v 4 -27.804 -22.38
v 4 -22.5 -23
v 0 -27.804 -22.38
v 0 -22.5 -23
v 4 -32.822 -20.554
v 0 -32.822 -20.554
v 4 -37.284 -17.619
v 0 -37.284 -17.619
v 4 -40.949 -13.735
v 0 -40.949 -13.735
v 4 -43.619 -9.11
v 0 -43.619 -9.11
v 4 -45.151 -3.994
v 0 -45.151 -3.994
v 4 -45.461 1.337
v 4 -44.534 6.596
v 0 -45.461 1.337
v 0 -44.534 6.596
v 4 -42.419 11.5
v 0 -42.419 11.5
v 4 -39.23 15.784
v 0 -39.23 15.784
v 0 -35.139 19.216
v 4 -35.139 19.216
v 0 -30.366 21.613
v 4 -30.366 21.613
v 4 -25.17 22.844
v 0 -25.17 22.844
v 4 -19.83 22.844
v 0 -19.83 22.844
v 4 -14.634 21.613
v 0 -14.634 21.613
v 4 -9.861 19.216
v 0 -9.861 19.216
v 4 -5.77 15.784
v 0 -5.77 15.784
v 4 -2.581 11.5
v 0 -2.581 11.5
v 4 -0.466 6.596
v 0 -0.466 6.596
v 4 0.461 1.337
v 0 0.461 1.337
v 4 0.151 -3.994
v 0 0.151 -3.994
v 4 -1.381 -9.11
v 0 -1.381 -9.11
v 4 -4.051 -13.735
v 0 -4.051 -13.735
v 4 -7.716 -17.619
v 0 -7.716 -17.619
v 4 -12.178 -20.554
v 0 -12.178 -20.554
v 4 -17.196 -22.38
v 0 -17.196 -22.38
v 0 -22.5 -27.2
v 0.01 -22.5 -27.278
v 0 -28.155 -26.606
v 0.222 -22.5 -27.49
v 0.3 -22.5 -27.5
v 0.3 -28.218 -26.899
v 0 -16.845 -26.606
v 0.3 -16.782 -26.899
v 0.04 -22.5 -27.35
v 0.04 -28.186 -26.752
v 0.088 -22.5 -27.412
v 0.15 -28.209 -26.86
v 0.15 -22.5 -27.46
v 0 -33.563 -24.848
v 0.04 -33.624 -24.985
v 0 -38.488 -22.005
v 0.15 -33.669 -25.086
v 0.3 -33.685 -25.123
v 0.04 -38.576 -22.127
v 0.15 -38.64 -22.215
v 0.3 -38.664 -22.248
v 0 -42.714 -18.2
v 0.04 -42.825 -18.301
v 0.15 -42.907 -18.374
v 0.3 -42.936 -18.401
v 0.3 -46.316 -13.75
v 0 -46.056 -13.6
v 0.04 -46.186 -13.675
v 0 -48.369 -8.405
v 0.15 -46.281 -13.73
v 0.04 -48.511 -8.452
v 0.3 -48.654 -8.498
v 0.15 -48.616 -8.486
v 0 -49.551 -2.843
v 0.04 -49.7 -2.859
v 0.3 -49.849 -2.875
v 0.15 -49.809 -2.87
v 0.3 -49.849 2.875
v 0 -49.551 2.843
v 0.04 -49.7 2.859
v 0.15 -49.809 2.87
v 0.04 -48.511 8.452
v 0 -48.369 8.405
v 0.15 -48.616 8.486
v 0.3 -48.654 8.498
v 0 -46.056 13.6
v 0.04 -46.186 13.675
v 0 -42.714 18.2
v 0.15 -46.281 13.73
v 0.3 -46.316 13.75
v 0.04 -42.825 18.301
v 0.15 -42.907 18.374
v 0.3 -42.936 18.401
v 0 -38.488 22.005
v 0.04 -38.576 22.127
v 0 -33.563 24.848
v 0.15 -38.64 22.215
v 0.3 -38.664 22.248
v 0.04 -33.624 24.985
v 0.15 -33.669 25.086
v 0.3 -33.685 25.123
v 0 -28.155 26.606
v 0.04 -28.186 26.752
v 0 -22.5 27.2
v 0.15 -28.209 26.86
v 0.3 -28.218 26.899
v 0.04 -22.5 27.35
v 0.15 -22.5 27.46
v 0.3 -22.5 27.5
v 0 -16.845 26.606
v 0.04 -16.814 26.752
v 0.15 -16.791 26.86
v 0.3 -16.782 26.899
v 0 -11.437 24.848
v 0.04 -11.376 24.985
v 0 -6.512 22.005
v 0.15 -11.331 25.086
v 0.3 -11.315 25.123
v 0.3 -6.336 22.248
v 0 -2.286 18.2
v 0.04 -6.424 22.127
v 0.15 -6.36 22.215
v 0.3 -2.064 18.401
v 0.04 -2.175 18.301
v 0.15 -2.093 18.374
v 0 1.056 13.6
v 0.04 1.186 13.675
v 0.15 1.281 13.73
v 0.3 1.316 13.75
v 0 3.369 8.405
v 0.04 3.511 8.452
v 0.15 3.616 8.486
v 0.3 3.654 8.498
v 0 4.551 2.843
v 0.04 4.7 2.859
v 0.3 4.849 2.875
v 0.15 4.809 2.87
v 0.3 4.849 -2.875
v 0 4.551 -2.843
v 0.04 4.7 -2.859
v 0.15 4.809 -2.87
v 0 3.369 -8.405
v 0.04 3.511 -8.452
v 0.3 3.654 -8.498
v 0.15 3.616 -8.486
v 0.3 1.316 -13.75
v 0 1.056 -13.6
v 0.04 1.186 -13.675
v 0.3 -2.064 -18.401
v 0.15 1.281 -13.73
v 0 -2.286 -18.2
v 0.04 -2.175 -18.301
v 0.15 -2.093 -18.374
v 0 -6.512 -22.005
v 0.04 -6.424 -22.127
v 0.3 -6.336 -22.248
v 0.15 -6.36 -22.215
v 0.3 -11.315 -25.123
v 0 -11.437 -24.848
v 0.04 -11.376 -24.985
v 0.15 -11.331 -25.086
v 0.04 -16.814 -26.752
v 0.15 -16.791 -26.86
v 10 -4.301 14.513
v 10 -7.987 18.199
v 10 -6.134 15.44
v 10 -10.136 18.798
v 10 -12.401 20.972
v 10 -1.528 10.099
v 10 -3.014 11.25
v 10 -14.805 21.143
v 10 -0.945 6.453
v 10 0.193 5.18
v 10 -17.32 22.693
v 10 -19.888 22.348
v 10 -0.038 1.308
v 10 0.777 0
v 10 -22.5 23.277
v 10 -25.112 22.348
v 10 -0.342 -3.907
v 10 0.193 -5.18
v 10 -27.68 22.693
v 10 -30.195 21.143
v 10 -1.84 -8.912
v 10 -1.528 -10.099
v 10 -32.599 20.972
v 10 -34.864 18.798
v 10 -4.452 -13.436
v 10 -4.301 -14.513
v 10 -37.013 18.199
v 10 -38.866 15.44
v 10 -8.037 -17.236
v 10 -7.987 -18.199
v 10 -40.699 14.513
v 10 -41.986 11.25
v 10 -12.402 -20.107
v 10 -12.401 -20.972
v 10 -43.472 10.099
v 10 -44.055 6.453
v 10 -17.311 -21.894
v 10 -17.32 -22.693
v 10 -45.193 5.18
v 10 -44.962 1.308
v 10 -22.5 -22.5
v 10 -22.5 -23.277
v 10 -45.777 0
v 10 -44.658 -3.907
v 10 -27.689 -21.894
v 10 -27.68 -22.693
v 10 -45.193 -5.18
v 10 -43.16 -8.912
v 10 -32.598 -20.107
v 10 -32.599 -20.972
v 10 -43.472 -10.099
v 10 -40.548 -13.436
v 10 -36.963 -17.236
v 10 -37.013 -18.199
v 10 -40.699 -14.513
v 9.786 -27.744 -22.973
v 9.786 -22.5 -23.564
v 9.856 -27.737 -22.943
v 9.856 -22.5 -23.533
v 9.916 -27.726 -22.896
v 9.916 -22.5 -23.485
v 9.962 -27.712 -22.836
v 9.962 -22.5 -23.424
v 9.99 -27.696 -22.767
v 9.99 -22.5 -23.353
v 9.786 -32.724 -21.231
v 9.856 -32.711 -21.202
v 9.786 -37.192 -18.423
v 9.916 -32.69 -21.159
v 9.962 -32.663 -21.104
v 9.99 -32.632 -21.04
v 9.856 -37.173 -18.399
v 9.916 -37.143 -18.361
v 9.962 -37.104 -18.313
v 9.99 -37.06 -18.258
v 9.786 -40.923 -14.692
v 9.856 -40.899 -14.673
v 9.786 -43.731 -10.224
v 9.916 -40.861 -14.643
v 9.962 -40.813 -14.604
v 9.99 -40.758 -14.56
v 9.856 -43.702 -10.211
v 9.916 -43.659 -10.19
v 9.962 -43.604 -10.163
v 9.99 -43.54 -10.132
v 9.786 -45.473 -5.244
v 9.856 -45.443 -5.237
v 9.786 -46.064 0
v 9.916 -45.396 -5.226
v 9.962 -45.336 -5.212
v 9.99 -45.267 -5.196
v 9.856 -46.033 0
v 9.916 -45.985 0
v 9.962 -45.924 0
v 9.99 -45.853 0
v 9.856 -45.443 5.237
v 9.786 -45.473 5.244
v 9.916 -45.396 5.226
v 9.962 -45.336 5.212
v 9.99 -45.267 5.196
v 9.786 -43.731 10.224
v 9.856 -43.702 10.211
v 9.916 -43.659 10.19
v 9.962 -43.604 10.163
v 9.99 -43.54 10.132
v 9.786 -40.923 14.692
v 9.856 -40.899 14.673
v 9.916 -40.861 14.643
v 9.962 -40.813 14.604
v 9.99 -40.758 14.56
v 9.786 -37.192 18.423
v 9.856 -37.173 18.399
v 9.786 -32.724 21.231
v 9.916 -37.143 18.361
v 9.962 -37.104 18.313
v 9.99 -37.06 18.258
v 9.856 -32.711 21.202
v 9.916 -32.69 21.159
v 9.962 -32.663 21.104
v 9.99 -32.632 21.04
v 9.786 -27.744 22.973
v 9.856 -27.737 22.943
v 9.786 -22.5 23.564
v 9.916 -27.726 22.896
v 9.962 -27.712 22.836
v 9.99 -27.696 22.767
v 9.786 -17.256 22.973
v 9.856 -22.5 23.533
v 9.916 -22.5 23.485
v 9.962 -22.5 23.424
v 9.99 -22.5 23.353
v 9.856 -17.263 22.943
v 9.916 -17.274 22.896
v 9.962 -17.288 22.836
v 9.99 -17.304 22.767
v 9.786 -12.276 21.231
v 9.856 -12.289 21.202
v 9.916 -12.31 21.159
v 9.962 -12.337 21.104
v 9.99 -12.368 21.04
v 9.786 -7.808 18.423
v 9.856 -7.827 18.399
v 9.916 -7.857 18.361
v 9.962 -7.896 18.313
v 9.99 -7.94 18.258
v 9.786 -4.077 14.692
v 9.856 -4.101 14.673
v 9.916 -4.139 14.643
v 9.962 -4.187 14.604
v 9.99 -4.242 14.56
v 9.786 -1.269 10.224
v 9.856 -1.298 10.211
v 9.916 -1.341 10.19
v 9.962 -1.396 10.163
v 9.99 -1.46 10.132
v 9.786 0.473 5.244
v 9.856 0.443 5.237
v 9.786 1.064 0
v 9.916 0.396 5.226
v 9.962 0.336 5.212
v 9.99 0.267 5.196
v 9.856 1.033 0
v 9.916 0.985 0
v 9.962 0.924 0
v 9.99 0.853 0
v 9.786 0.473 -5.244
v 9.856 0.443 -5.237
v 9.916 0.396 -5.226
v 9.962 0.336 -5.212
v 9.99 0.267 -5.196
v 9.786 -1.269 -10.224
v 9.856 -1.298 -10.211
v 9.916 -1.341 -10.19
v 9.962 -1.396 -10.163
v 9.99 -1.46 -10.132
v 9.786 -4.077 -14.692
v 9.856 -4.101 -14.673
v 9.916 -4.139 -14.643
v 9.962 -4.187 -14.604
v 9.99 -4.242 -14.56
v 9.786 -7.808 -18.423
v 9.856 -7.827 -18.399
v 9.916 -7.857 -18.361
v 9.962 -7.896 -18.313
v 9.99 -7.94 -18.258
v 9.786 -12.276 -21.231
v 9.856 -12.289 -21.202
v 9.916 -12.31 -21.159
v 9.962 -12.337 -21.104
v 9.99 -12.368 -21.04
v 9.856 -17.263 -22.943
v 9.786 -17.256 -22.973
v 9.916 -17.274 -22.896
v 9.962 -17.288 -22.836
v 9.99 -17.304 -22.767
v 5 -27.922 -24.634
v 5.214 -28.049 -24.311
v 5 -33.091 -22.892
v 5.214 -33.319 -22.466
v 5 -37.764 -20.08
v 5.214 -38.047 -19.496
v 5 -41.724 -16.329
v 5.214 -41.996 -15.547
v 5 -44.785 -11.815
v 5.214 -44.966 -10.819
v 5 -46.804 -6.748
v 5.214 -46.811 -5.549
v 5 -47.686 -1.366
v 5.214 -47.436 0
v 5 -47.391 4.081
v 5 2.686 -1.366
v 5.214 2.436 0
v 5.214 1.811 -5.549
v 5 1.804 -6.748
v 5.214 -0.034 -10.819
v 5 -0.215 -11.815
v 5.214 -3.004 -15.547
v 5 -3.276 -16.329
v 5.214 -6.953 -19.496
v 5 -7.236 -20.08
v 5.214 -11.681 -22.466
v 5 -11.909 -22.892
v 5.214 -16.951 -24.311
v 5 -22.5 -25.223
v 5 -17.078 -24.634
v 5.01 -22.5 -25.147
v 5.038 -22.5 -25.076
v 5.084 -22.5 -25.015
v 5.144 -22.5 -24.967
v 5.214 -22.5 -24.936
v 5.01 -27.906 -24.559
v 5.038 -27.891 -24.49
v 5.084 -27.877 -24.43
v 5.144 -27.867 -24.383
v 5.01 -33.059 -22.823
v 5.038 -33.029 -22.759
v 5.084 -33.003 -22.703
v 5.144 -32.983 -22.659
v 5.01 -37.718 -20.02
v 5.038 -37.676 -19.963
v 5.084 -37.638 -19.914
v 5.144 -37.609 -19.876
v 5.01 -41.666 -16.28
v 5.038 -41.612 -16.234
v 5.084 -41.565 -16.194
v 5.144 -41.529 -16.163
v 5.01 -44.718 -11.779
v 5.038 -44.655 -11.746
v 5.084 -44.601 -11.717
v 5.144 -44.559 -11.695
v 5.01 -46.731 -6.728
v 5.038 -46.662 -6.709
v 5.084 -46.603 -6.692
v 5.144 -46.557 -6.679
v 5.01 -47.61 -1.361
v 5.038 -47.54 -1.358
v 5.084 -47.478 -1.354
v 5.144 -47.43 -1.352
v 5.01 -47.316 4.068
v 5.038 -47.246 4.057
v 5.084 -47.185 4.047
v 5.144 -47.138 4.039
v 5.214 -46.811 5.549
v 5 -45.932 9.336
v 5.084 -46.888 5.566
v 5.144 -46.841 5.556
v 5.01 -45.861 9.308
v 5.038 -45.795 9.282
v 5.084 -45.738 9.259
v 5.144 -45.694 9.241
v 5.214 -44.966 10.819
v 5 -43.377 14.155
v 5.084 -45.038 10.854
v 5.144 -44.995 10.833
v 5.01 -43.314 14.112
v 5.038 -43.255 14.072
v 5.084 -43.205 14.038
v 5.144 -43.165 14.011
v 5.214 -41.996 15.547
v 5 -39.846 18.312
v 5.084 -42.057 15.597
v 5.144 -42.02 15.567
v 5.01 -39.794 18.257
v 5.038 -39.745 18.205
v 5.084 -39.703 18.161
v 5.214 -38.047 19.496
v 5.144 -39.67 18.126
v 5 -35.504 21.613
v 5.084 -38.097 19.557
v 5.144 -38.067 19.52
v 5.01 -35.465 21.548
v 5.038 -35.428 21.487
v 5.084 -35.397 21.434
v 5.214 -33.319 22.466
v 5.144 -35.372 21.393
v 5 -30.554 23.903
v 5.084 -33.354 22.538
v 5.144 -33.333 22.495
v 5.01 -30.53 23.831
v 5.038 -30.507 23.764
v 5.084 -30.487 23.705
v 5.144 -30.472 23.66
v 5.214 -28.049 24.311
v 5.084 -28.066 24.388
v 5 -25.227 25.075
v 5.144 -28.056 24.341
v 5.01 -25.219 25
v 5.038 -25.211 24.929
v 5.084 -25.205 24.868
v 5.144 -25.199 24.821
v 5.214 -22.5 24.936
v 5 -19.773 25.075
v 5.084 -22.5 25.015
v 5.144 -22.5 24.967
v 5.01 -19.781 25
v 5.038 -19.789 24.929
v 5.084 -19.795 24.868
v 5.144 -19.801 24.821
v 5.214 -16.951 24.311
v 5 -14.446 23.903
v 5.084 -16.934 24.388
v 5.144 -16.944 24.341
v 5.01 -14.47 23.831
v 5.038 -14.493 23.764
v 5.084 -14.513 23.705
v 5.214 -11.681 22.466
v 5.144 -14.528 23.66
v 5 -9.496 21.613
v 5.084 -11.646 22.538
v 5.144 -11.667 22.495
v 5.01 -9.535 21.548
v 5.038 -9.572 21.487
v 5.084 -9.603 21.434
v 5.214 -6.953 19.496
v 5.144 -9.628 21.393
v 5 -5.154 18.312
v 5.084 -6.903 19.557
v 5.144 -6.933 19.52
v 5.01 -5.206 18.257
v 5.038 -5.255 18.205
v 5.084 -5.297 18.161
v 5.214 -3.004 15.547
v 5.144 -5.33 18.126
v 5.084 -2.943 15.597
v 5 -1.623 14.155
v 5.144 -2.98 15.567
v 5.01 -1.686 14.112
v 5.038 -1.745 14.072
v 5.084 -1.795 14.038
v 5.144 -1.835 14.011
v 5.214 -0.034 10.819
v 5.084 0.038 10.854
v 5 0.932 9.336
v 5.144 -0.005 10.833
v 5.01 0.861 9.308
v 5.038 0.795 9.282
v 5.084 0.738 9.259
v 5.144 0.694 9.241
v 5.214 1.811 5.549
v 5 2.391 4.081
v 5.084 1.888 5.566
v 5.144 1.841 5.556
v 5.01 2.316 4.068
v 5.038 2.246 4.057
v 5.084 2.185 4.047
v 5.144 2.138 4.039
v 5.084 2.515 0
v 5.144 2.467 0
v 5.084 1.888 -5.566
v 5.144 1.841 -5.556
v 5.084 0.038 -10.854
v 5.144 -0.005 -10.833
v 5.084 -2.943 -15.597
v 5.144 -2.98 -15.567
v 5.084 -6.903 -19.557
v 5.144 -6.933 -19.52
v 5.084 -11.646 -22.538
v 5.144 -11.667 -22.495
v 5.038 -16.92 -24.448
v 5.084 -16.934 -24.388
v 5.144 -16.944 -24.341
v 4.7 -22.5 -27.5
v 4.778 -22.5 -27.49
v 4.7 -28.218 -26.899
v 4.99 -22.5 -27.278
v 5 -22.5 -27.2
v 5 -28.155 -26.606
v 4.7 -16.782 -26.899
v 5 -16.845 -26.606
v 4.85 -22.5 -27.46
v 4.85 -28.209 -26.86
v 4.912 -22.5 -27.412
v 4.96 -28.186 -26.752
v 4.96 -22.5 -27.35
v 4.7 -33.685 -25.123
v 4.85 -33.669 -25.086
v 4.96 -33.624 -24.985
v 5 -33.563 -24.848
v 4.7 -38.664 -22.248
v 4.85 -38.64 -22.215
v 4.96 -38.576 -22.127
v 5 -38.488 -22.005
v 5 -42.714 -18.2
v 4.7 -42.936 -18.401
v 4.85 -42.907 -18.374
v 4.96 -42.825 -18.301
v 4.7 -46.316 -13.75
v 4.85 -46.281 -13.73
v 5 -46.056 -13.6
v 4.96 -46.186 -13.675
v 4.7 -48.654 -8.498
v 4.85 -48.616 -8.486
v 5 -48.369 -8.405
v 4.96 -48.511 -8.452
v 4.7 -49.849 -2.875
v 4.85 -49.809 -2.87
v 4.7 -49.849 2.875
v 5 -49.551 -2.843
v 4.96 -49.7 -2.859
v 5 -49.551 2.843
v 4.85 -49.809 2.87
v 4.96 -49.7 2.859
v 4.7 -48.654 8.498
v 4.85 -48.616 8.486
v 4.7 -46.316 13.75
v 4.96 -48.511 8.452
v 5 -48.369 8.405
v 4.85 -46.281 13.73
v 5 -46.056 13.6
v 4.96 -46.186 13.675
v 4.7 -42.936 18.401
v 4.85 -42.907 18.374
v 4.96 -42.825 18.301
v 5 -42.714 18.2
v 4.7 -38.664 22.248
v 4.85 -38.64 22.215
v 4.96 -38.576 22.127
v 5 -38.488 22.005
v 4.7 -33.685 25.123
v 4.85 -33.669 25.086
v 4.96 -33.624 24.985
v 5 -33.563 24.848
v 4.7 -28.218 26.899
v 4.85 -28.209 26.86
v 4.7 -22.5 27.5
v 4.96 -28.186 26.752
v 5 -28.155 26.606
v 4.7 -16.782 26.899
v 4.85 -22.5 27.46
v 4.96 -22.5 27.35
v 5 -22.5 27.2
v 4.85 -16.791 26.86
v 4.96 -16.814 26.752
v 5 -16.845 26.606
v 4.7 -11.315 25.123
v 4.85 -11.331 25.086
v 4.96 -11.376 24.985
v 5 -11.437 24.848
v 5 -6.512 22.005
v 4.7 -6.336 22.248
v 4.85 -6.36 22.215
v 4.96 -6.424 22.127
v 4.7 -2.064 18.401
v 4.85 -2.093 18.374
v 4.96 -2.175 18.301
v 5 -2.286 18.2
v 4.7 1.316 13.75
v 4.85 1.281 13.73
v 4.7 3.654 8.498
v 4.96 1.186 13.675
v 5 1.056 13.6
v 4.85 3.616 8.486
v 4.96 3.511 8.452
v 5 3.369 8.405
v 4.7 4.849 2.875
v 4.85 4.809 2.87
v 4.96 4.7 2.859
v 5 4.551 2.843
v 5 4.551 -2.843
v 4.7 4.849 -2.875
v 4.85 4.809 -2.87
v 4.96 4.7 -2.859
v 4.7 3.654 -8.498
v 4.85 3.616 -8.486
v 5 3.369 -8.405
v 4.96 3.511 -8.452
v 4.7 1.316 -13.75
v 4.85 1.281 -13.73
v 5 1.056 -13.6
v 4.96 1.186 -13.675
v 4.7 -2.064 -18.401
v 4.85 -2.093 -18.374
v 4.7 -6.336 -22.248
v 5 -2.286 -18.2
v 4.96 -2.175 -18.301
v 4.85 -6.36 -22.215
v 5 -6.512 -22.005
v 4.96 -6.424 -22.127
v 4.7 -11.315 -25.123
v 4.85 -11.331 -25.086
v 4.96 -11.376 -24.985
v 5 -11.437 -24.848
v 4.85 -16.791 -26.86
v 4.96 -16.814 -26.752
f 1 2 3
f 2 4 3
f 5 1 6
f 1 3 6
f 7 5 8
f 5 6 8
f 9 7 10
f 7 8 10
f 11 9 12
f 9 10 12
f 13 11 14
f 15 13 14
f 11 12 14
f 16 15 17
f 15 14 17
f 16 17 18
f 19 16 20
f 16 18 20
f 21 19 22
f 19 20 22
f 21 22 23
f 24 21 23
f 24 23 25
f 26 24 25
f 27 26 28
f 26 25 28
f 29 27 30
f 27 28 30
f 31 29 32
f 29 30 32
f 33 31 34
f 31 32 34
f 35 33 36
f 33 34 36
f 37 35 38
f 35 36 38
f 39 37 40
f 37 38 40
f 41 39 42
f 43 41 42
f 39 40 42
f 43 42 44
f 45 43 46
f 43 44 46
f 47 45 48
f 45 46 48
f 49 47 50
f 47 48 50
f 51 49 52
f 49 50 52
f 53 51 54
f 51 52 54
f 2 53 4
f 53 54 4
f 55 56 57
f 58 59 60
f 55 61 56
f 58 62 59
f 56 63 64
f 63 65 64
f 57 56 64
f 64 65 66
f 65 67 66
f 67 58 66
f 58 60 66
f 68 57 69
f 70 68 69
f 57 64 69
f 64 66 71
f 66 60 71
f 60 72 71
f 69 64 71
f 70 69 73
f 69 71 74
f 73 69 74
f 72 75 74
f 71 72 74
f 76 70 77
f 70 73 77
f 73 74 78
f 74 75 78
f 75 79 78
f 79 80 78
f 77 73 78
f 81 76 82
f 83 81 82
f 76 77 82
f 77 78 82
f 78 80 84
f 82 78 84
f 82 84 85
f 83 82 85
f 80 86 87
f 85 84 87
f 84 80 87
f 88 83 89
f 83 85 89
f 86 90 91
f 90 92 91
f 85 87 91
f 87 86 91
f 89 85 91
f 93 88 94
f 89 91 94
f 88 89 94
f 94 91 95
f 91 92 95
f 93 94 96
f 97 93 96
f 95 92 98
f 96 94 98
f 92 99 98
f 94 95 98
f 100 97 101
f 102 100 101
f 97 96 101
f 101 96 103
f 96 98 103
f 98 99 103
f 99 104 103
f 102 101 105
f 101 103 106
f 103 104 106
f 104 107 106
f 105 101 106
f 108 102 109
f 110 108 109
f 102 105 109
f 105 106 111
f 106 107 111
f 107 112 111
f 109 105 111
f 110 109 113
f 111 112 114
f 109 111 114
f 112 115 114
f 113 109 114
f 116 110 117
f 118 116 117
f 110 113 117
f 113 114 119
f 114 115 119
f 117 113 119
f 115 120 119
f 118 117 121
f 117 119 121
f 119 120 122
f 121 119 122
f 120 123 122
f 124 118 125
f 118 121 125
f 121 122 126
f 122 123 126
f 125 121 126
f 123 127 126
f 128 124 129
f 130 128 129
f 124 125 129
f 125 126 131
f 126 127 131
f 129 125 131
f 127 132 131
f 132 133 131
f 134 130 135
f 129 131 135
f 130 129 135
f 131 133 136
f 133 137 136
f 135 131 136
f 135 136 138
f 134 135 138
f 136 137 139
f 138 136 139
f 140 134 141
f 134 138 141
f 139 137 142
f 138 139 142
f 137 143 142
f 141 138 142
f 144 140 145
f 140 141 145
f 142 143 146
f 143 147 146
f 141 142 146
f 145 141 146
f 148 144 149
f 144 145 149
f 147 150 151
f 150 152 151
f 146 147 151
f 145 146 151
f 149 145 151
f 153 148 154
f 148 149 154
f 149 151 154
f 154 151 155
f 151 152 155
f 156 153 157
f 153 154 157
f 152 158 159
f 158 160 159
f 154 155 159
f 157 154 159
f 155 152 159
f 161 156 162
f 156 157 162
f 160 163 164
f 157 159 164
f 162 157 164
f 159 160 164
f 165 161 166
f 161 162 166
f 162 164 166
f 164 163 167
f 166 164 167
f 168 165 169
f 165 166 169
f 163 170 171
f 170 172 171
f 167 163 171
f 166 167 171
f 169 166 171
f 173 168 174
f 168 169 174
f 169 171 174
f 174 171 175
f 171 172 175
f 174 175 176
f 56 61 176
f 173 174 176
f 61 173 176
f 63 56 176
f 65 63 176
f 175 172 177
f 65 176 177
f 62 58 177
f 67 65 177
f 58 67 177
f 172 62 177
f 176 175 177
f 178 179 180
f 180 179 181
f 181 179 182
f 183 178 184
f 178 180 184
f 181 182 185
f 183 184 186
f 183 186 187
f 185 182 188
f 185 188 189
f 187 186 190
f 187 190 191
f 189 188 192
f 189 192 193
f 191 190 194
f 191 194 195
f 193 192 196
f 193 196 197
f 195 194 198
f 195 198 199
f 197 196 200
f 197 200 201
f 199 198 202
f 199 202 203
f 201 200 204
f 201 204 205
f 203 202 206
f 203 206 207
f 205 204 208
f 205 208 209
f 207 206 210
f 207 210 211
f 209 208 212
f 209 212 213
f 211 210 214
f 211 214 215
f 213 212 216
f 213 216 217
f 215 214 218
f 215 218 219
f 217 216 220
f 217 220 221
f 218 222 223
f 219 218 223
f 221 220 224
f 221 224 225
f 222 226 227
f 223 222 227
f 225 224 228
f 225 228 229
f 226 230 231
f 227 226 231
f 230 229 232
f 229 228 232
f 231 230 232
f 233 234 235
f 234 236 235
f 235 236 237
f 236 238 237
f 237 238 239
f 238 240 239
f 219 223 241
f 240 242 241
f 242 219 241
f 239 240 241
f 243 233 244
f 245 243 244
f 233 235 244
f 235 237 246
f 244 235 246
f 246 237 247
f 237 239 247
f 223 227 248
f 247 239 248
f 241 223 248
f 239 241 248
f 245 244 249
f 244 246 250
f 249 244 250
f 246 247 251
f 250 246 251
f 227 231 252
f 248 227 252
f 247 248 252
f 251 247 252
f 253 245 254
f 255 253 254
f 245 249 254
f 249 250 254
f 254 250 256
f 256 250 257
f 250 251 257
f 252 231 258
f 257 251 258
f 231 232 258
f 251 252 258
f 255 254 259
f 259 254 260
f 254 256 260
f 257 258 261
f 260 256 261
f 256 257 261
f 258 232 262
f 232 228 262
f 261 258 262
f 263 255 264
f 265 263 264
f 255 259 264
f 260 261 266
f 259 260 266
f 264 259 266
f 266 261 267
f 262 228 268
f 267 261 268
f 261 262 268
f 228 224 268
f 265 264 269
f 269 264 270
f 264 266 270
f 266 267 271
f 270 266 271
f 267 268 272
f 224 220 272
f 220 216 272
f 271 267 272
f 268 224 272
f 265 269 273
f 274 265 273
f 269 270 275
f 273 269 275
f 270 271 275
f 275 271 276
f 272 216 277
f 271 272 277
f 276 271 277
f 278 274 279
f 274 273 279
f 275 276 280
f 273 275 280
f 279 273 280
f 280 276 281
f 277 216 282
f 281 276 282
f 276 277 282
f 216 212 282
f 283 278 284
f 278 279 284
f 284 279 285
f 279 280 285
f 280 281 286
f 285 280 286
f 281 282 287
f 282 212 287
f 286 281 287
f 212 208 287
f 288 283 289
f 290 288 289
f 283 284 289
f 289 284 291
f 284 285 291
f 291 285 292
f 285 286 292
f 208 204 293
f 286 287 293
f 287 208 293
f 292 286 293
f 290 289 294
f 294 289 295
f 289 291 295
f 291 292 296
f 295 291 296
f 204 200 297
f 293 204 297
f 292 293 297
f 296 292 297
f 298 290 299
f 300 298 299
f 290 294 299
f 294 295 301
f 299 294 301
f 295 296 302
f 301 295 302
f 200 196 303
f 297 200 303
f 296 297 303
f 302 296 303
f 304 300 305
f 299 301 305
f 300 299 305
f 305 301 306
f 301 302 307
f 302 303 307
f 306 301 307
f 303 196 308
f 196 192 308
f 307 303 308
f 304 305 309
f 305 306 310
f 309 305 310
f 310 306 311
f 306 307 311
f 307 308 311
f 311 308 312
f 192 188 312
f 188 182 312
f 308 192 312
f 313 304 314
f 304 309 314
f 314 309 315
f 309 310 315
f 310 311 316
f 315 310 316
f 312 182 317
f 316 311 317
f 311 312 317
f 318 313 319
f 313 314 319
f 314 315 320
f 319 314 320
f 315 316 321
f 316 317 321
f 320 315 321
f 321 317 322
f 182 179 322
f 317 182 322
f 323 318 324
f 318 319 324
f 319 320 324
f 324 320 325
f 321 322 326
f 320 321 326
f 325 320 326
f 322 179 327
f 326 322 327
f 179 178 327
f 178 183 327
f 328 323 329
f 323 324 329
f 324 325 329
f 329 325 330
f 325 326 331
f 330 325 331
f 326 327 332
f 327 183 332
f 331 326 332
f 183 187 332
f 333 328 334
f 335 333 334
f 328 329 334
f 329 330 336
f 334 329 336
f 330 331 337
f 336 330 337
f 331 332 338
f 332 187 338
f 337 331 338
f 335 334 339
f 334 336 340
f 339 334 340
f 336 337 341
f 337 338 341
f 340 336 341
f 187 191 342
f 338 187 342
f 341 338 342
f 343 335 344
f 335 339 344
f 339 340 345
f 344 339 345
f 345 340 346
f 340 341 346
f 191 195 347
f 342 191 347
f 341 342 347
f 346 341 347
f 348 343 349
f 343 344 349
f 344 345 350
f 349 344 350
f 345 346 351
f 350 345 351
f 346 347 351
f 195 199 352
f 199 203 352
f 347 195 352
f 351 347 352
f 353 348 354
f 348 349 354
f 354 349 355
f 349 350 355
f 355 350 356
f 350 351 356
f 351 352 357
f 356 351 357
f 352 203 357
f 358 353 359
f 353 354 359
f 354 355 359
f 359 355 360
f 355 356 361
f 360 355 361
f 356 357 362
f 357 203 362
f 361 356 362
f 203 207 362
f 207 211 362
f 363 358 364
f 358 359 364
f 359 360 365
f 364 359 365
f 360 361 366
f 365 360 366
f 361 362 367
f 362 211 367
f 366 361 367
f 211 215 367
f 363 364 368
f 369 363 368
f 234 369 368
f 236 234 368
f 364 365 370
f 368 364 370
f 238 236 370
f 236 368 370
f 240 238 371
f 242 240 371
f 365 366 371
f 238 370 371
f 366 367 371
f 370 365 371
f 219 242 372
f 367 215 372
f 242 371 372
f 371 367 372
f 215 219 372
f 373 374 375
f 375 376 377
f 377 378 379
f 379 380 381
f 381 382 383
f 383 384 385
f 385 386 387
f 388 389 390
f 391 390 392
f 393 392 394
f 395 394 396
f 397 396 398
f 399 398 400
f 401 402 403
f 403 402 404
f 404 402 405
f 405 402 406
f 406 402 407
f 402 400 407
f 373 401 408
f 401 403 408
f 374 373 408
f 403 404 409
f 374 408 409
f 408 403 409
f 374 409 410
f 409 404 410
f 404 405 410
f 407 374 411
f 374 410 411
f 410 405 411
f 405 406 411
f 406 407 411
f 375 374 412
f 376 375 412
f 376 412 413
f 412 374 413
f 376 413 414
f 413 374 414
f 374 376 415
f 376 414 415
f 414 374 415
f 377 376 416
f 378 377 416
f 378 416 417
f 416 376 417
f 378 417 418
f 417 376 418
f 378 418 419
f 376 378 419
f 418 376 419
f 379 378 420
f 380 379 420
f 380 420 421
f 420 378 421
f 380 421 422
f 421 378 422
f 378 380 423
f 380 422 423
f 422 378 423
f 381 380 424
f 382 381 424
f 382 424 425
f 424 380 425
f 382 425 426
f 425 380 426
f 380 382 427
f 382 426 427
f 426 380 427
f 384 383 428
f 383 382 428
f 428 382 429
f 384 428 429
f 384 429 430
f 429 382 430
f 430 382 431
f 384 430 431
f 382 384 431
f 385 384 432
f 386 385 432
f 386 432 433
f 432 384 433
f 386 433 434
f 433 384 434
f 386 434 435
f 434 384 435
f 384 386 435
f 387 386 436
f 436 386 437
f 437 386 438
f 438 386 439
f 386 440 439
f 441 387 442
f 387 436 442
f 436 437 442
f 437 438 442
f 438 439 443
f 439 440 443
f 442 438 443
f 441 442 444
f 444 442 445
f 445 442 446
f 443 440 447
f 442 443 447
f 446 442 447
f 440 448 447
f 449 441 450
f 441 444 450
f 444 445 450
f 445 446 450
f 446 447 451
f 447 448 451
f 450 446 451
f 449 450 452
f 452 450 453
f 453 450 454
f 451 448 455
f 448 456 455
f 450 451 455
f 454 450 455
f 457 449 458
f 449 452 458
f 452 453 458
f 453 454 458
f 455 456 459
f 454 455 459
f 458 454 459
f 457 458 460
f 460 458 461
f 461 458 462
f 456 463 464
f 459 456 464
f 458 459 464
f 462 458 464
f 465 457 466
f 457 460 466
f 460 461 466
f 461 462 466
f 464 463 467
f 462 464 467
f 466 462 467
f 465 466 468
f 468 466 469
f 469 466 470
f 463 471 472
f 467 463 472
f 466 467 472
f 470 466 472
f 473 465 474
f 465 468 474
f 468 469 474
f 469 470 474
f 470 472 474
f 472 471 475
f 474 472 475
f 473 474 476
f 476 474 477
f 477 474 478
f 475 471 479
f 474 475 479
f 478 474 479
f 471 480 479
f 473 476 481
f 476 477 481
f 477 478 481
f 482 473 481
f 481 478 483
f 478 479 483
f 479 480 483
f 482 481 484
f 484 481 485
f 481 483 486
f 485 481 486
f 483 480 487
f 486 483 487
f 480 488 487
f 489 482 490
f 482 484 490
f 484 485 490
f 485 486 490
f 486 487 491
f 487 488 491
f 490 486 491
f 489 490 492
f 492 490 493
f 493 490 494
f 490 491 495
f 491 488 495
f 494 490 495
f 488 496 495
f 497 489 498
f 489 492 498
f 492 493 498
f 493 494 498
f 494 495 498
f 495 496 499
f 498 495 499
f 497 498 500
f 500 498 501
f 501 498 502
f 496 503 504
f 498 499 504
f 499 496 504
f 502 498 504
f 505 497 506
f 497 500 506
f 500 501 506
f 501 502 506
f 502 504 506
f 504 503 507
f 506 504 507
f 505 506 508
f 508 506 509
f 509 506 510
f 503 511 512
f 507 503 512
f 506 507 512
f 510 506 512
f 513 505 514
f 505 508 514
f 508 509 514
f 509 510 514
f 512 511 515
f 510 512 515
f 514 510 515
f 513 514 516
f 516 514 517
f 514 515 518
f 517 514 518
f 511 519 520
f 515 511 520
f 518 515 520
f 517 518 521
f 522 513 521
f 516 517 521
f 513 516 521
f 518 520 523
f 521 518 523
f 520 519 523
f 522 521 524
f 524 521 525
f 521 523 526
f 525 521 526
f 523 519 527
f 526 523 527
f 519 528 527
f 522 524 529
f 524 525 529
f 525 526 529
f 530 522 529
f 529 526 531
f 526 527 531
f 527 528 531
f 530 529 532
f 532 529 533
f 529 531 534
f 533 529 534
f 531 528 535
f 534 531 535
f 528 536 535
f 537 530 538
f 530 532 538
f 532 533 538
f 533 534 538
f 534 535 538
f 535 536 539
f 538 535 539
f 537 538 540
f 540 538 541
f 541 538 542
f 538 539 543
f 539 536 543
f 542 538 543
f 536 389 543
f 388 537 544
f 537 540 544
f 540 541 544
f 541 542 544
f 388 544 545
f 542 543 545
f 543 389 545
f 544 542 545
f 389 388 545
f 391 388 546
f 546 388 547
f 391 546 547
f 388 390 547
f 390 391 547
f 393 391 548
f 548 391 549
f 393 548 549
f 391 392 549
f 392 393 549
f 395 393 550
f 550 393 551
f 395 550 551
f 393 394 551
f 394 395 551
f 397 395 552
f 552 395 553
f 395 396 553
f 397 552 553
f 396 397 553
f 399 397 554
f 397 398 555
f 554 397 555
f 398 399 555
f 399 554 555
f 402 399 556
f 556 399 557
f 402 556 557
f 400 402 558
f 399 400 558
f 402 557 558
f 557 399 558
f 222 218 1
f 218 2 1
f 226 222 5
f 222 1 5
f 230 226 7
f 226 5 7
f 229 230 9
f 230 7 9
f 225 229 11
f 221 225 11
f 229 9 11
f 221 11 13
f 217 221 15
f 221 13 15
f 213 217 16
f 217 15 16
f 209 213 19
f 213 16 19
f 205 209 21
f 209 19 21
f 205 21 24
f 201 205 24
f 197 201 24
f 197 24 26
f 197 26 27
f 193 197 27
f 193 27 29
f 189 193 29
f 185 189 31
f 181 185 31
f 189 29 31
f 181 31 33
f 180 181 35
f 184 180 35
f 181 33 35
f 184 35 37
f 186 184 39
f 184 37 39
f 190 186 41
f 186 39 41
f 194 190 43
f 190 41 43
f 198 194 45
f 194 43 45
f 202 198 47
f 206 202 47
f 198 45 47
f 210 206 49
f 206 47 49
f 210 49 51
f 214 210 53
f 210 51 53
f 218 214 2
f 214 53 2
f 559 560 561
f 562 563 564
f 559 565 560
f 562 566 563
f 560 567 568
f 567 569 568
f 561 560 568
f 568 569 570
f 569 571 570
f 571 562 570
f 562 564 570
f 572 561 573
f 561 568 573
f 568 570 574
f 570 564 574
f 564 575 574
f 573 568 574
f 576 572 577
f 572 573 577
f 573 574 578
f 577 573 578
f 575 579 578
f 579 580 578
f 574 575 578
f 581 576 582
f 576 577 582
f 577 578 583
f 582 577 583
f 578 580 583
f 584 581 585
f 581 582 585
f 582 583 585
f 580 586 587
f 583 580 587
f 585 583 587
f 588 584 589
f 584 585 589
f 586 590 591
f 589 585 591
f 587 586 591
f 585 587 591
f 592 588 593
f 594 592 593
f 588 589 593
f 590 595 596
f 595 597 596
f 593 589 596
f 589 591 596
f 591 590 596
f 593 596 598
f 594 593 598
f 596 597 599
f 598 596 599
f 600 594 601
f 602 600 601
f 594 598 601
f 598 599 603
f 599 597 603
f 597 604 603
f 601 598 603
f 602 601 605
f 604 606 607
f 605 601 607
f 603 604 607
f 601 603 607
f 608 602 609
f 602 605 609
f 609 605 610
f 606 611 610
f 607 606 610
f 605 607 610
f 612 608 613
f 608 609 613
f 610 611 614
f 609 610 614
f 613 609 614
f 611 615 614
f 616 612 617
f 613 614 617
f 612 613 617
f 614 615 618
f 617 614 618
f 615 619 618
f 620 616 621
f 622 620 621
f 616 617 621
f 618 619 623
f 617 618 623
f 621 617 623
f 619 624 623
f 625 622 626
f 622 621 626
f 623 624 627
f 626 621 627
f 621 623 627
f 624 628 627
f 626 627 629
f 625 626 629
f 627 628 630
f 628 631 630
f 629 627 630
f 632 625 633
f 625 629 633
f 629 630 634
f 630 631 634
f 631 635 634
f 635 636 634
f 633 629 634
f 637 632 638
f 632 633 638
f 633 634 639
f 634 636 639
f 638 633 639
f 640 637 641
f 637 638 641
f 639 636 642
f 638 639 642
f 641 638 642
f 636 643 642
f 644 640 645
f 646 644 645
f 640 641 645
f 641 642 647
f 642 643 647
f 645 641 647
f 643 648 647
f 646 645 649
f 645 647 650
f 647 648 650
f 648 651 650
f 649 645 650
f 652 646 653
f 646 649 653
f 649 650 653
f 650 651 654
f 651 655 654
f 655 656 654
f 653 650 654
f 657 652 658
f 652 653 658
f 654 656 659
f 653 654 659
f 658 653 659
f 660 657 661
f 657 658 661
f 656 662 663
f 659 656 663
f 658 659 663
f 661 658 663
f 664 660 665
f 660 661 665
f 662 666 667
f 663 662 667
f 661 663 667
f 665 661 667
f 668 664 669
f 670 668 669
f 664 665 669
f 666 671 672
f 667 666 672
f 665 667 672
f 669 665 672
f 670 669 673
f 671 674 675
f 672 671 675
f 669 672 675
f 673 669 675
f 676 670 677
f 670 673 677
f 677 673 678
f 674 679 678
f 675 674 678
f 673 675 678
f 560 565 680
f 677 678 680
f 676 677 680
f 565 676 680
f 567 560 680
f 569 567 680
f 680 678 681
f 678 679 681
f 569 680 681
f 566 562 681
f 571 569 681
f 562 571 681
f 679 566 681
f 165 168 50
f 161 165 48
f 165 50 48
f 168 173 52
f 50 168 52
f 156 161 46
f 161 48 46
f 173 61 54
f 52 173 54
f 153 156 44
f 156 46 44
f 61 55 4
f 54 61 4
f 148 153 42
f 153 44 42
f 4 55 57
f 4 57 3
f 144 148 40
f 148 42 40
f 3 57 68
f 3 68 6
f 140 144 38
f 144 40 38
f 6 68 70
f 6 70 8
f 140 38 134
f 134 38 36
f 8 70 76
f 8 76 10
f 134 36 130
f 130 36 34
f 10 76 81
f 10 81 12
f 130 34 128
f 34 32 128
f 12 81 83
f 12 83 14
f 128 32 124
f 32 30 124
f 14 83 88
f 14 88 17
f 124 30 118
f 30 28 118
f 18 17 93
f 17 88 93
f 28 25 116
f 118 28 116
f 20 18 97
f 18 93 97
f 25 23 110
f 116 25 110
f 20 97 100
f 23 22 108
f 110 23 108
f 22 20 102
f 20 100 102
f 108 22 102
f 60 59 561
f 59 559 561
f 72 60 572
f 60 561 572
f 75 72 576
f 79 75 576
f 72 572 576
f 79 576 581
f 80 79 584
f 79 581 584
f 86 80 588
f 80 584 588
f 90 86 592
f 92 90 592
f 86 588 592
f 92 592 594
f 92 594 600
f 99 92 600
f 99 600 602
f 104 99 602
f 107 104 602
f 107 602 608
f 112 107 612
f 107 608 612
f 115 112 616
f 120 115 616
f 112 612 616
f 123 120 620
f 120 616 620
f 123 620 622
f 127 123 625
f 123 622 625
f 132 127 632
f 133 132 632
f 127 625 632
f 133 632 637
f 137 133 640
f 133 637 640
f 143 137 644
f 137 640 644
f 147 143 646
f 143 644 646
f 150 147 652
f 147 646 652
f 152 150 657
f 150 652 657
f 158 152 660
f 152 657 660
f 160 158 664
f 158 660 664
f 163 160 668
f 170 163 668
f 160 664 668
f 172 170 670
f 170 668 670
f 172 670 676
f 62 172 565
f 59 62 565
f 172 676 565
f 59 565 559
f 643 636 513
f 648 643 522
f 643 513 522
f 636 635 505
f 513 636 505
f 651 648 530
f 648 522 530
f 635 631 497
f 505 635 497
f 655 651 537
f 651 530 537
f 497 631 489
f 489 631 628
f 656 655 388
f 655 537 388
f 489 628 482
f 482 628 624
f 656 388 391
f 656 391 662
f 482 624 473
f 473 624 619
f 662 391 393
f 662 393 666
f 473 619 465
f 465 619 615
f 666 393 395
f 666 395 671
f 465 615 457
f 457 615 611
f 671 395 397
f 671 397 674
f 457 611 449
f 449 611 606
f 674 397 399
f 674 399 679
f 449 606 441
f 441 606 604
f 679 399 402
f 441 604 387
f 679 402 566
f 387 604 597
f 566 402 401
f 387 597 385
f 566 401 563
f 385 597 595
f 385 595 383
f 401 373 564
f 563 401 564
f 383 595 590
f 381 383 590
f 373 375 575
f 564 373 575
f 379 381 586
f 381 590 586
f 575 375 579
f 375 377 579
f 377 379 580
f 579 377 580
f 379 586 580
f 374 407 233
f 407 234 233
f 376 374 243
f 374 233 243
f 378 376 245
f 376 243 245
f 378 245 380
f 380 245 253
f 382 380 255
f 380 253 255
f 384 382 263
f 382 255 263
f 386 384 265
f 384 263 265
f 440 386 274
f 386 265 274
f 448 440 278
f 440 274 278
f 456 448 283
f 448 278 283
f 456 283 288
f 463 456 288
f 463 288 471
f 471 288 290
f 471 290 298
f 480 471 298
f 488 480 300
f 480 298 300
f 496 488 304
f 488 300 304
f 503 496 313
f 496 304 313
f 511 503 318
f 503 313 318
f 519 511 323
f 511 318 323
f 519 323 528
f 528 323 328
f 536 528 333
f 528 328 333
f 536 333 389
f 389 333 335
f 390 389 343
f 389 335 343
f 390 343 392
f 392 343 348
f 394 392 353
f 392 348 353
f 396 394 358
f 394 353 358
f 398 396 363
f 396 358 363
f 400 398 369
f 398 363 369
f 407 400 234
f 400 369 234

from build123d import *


with BuildPart() as part:
    # Sketch1 → Revolve1 (revolve)
    with BuildSketch(Plane.XY, mode=Mode.PRIVATE) as revolve1_sk:
        with BuildLine():
            Line((0.3, 5), (4.7, 5))
            ThreePointArc((4.7, 5), (4.912132034, 4.912132034), (5, 4.7))
            Line((5, 4.7), (5, 2.723209195))
            ThreePointArc((5, 2.723209195), (5.059312122, 2.544130036), (5.213795634, 2.43586131))
            Line((5.213795634, 2.43586131), (9.786204366, 1.06413869))
            ThreePointArc((9.786204366, 1.06413869), (9.940687878, 0.955869964), (10, 0.776790805))
            Line((10, 0.776790805), (10, 0))
            Line((10, 0), (4, 0.5))
            Line((4, 0.5), (0, 0.5))
            Line((0, 0.5), (0, 4.7))
            ThreePointArc((0, 4.7), (0.087867966, 4.912132034), (0.3, 5))
        make_face()
    revolve(revolve1_sk.sketch.rotate(Axis((10, -22.5, 0), (-1, 0, 0)), 90), axis=Axis((10, -22.5, 0), (-1, 0, 0)))


solid = part.part
